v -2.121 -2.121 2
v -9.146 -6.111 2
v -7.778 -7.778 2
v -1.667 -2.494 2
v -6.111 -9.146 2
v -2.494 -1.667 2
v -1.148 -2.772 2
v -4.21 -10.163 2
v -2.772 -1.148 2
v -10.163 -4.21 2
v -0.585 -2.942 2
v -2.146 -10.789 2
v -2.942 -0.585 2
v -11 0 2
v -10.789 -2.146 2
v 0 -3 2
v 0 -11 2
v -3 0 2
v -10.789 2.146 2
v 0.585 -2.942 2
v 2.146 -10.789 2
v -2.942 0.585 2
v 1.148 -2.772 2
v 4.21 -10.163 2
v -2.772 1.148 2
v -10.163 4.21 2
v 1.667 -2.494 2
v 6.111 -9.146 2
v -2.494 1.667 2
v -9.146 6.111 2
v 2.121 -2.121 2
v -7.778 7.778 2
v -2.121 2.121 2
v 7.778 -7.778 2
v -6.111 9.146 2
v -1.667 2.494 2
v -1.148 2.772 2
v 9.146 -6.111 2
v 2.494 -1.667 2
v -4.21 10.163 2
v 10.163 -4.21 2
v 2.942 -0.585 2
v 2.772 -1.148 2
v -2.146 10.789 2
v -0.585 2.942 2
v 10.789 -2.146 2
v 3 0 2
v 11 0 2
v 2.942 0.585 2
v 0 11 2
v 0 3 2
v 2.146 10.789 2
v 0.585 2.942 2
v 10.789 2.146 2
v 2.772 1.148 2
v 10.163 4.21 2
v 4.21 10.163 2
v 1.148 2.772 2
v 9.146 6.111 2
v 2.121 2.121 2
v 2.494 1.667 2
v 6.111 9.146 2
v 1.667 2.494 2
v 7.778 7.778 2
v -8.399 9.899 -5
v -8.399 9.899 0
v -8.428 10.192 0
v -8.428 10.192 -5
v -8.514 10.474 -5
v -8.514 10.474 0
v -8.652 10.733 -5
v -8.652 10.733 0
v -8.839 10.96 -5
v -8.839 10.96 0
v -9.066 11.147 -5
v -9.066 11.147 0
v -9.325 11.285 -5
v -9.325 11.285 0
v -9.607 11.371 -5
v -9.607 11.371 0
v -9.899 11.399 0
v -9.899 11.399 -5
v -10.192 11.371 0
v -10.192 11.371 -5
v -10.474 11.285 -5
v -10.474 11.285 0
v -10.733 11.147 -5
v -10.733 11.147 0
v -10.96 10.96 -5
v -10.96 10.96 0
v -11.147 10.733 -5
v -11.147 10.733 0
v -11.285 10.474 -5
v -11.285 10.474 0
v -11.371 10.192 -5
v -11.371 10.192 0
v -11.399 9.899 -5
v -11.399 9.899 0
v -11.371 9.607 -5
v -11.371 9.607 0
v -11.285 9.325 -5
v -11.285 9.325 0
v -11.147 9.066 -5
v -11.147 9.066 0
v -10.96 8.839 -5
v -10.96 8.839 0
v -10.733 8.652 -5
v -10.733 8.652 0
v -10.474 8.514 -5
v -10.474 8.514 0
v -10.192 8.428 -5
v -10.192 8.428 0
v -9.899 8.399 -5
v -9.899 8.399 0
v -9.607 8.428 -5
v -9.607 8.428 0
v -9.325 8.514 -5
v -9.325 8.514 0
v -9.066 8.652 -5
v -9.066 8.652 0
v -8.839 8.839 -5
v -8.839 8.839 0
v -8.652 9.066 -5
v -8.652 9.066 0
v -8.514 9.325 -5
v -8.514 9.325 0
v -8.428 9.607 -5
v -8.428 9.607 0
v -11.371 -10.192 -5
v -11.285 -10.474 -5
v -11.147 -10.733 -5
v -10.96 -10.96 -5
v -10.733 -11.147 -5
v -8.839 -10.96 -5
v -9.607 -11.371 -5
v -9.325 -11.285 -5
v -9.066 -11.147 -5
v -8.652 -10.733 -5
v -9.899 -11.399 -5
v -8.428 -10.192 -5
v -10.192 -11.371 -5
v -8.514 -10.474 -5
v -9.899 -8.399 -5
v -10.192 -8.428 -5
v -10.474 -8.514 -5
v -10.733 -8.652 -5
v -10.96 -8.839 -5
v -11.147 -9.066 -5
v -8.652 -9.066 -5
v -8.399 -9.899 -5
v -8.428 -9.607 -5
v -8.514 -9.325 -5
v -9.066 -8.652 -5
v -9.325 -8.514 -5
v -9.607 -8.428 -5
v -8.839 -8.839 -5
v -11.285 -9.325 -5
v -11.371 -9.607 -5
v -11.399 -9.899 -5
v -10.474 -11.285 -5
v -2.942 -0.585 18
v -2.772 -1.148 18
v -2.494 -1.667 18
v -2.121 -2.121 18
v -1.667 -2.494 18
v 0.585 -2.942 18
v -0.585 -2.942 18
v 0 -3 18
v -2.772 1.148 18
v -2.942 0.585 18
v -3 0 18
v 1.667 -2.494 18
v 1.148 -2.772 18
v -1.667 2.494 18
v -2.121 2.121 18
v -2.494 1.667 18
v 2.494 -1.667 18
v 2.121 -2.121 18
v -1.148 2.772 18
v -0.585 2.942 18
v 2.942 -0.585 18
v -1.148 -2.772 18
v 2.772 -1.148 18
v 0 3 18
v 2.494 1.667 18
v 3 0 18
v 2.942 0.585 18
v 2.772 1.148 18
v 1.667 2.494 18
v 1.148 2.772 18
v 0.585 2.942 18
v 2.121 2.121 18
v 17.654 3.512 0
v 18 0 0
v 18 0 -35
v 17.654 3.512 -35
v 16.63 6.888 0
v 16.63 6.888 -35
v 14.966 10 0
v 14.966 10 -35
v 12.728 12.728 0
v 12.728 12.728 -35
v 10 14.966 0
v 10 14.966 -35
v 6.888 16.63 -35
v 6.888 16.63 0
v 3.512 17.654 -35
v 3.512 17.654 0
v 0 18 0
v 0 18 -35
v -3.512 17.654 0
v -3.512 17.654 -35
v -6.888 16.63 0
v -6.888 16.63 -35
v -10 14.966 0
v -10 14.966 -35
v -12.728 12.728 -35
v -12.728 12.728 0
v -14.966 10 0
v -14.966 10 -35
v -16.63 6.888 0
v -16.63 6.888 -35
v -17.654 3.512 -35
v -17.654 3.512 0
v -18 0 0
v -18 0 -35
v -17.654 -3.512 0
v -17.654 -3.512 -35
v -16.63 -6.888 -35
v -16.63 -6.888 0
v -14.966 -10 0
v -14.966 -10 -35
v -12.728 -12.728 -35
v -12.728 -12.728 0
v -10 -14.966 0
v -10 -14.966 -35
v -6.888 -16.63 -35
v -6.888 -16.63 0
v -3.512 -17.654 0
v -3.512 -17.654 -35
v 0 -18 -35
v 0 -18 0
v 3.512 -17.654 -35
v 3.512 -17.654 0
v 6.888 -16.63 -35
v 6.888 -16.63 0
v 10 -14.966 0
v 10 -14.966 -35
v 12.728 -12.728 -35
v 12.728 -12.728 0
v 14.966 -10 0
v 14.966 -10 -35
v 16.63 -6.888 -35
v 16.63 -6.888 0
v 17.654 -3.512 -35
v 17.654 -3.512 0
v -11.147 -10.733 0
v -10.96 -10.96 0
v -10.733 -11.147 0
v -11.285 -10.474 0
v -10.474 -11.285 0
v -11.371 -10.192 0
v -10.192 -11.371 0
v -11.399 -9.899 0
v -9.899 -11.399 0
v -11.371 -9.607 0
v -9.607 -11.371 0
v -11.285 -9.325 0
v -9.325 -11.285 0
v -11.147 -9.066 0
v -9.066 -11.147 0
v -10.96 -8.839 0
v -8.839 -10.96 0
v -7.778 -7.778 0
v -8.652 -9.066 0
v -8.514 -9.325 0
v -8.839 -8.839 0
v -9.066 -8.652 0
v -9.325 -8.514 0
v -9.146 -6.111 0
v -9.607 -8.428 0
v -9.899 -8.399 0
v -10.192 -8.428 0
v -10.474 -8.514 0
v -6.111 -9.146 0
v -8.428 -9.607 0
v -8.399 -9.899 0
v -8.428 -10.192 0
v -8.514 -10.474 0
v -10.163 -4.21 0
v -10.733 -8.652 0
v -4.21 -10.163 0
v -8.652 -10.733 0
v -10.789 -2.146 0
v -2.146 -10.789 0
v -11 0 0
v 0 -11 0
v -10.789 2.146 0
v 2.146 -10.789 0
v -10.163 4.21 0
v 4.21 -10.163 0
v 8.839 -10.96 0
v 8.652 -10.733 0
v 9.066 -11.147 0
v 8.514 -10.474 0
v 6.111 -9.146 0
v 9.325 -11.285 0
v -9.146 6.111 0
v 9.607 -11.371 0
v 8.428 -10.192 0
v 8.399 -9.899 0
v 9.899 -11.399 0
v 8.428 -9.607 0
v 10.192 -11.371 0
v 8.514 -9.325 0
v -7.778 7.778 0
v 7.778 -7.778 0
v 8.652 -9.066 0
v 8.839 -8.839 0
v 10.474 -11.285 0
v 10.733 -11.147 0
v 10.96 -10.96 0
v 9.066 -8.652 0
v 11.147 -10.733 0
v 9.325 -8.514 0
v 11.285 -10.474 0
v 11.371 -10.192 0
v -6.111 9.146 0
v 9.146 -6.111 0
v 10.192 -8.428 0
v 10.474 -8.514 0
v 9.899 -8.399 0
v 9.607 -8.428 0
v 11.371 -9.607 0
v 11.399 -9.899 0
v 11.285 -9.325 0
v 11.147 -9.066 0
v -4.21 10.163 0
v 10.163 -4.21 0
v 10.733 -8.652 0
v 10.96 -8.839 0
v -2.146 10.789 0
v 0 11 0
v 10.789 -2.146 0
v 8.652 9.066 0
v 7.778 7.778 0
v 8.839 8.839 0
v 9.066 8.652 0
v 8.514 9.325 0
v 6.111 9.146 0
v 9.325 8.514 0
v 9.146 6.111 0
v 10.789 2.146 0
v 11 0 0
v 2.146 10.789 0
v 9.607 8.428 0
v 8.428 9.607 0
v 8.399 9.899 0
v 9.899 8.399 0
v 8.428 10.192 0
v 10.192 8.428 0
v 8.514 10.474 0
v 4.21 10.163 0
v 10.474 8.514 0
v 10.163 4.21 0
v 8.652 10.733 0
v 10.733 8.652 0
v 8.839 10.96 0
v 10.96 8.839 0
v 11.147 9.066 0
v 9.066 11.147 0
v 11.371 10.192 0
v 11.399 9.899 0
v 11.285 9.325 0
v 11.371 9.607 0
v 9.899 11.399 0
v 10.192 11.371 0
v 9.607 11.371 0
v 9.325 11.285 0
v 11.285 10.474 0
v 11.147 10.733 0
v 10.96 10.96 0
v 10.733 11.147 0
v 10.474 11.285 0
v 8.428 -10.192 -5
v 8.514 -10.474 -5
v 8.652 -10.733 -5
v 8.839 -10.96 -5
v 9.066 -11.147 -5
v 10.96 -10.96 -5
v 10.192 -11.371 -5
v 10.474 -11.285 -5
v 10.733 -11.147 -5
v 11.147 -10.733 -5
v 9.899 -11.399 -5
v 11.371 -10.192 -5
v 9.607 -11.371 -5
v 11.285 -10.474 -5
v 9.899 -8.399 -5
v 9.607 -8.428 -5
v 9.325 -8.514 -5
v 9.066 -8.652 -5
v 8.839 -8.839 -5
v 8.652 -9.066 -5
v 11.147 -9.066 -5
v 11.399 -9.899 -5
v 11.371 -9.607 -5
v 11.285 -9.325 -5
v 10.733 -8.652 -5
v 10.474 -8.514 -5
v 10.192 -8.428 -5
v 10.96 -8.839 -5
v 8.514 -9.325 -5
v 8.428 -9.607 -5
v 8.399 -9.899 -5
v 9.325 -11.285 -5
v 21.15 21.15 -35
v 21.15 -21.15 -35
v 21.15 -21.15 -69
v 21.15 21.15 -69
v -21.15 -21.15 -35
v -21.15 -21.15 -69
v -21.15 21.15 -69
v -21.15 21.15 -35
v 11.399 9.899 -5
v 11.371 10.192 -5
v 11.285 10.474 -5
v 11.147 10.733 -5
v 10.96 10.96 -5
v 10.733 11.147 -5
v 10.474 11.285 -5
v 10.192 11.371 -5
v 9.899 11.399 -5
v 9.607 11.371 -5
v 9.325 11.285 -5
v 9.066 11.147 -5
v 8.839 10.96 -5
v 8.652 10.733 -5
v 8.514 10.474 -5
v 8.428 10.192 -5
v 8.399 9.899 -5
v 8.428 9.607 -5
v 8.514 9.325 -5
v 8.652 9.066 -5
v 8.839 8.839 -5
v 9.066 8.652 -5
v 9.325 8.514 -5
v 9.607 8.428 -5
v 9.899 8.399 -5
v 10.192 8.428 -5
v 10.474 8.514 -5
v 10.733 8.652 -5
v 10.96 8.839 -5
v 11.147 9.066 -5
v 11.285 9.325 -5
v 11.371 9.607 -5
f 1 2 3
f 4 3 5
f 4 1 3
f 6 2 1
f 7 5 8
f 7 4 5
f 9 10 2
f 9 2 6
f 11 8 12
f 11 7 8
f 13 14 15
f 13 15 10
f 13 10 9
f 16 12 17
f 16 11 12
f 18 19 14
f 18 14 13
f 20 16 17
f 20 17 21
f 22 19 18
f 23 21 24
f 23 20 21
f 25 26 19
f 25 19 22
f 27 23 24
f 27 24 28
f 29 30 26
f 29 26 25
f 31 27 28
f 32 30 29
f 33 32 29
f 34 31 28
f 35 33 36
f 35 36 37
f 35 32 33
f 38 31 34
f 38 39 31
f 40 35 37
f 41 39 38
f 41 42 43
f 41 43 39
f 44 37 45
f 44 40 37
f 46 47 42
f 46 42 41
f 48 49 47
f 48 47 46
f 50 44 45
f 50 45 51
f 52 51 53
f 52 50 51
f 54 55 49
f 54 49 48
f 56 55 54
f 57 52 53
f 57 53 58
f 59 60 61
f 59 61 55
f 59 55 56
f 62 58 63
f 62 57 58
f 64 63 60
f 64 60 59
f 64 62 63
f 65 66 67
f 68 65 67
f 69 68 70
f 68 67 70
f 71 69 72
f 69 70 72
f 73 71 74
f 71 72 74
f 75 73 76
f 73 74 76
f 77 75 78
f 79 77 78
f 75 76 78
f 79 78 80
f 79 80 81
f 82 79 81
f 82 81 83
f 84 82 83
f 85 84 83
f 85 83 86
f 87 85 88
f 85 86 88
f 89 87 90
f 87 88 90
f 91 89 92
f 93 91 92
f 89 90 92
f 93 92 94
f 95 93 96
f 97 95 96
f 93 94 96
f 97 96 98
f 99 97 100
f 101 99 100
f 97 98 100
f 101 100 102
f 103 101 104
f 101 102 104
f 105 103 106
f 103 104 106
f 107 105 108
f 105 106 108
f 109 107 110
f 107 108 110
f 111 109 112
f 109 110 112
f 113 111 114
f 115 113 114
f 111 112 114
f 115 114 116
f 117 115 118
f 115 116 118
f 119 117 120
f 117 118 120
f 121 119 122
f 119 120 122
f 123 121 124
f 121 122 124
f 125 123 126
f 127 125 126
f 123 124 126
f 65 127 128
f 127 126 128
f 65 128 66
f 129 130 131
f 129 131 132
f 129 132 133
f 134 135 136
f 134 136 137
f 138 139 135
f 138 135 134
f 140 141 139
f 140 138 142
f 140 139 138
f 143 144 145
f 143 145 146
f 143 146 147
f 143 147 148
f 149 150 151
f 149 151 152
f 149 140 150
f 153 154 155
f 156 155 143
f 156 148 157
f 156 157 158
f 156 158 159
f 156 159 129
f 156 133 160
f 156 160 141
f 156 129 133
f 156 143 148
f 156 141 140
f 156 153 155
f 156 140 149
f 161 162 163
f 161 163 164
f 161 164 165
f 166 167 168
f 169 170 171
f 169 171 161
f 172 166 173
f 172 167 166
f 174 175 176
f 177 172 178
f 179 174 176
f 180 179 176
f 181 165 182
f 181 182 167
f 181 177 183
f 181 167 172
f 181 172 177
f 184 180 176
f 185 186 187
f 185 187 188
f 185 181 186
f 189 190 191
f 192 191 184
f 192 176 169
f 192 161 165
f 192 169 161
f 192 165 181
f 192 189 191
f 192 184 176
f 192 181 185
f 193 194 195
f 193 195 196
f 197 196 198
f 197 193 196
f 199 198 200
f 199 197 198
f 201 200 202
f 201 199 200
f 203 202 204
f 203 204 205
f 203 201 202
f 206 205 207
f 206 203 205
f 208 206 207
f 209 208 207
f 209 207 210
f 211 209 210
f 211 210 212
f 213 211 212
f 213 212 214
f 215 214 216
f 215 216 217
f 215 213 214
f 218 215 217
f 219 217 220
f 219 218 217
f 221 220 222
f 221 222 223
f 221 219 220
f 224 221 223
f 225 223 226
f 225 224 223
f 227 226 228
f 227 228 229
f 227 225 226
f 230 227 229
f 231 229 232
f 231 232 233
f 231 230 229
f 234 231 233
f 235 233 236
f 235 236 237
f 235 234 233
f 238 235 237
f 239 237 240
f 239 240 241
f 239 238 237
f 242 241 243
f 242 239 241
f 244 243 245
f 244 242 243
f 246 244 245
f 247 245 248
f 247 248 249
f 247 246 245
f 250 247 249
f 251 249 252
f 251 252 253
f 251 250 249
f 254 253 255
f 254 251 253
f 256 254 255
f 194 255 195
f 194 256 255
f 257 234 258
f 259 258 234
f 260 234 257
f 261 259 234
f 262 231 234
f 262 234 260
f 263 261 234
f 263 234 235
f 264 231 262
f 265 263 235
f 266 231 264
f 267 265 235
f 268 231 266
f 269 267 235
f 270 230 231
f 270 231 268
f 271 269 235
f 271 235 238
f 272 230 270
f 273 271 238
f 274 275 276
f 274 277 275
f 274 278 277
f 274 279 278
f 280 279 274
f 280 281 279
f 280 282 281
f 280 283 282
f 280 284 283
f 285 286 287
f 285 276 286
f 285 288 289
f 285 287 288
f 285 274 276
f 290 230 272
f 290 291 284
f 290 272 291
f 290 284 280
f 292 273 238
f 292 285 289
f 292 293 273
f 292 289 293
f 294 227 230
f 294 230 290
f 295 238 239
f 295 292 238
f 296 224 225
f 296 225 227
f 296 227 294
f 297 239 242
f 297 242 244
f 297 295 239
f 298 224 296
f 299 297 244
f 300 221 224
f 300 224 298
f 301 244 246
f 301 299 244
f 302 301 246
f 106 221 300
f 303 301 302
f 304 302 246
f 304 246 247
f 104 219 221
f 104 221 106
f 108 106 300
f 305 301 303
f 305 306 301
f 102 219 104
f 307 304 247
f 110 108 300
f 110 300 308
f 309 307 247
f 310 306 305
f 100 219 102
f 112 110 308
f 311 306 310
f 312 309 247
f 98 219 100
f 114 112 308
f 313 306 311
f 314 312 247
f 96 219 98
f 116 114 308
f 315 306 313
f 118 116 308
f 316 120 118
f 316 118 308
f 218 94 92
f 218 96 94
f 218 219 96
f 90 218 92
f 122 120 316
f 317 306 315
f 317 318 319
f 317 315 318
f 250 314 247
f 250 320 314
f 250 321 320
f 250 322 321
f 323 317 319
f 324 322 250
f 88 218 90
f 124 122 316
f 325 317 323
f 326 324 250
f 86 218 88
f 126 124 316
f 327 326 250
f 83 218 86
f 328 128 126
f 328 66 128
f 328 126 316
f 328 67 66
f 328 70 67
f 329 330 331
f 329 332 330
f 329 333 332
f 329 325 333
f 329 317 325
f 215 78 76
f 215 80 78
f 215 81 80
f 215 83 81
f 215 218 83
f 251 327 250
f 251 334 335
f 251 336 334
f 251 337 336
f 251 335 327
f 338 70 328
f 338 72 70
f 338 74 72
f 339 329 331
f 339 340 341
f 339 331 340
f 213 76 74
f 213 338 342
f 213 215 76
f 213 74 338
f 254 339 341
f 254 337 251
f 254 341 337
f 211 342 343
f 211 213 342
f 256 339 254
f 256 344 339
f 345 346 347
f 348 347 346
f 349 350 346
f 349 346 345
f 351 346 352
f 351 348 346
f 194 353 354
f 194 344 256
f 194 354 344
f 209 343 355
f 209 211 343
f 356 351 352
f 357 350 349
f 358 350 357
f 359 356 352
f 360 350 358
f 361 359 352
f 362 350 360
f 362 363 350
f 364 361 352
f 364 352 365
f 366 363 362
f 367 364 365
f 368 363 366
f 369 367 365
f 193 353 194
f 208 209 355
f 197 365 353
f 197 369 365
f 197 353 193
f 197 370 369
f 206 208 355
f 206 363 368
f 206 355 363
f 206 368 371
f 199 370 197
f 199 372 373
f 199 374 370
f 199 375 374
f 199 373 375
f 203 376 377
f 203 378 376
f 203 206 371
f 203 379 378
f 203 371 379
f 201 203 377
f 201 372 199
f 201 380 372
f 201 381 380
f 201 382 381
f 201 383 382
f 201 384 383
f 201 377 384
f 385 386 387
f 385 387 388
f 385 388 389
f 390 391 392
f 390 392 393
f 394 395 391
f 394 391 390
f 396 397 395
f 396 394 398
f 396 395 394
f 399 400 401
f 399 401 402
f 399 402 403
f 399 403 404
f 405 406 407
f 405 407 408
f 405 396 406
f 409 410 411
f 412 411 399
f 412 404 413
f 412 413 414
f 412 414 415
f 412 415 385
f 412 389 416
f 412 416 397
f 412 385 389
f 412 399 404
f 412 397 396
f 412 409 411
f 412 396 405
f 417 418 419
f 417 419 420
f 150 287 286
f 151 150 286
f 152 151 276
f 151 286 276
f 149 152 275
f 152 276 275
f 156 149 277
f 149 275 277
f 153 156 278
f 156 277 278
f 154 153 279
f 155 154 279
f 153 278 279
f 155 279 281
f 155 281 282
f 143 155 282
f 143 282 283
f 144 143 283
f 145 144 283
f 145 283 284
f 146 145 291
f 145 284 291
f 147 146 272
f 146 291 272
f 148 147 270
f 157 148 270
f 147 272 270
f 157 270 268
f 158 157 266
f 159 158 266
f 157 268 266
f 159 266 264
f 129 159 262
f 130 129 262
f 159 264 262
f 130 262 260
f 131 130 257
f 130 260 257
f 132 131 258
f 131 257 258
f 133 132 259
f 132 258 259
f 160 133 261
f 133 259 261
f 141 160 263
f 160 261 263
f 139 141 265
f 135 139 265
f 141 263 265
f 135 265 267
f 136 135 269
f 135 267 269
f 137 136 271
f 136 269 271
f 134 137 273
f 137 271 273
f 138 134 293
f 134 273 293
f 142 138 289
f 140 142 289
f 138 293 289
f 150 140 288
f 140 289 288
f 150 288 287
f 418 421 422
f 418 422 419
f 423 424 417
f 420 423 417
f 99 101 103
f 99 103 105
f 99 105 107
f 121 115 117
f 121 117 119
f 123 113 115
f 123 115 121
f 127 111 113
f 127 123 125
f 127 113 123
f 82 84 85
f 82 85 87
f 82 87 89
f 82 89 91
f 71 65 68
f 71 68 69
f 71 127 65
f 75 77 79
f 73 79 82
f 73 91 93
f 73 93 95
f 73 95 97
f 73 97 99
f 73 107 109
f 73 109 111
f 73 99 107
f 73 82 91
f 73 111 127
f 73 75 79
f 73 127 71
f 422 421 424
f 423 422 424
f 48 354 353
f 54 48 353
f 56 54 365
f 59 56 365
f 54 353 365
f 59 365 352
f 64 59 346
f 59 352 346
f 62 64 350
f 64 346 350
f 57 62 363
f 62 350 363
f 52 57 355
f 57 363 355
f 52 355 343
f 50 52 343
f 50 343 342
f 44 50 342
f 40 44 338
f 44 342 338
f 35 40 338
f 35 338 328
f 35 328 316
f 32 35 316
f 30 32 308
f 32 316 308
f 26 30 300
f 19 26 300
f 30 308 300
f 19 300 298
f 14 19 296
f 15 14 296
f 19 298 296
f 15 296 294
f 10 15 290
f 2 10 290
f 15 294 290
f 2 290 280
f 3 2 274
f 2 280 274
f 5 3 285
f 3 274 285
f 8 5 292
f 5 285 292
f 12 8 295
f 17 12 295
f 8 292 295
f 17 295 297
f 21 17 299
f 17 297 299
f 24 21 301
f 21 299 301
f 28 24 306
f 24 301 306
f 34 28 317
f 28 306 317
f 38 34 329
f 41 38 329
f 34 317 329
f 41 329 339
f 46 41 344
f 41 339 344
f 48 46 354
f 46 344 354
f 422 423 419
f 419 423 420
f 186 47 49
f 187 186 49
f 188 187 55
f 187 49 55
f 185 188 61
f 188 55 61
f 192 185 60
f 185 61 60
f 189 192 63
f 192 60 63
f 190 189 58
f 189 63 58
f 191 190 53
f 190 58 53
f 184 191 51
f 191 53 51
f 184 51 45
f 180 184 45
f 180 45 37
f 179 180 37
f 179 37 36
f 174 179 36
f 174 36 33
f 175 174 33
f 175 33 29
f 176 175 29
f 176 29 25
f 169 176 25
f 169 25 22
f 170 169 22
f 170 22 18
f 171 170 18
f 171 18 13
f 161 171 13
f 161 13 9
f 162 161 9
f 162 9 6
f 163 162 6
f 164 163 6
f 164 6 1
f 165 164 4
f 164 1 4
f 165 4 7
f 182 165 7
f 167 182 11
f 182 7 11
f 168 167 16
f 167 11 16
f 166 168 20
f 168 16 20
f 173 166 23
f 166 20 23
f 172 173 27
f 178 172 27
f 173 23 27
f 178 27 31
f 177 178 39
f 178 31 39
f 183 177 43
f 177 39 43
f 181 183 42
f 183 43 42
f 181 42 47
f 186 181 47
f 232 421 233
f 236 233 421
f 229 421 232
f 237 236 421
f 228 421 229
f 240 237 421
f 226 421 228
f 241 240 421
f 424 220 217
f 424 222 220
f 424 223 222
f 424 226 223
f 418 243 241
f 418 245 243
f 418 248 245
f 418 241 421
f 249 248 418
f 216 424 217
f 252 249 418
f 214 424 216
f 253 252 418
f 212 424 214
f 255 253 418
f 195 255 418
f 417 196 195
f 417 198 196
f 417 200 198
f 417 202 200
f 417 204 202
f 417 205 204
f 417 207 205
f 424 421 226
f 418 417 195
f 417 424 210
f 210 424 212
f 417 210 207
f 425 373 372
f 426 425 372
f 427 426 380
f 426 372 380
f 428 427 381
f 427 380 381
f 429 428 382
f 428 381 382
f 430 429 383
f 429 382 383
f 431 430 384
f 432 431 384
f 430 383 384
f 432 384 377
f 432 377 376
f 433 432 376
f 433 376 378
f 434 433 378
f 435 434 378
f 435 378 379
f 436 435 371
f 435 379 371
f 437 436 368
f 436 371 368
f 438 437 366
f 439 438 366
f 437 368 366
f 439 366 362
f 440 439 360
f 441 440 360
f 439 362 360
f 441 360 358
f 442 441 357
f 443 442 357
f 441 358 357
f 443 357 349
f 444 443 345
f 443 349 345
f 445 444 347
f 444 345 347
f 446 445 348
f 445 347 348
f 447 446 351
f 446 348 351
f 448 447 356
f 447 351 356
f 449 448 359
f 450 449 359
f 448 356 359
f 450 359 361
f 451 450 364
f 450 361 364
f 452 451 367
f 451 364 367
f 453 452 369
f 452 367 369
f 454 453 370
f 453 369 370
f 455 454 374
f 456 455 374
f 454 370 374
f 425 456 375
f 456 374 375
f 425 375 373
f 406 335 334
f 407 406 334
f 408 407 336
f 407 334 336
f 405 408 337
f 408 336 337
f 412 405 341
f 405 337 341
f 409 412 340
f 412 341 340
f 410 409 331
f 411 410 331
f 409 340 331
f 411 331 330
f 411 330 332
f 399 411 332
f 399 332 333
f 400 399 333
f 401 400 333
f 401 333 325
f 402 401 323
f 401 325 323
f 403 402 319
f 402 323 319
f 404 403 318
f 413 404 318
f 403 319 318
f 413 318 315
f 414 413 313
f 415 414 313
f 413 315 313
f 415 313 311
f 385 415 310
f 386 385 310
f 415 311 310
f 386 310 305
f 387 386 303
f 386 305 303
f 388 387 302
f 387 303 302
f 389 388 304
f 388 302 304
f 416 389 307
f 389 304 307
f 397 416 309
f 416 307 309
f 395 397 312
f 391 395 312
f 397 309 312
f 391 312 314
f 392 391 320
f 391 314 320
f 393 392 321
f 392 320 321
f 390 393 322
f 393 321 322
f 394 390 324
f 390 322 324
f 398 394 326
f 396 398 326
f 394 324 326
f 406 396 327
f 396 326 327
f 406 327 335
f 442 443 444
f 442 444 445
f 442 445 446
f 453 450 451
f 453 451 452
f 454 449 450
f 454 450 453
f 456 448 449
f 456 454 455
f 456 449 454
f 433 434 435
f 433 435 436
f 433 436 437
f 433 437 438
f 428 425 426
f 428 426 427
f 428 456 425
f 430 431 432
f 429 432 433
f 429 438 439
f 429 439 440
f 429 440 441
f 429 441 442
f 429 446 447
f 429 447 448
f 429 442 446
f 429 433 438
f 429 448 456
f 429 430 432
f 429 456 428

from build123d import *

# Parameters (mm, degrees)
SKETCH_R     = 18
PAD_DEPTH    = 35
SKETCH001_W  = 42.3
SKETCH001_H  = 42.3
PAD001_DEPTH = 34
SKETCH002_R  = 11
PAD002_DEPTH = 2
SKETCH003_R  = 3
PAD003_DEPTH = 18
SKETCH004_R  = 1.5
POCKET_DEPTH = 5


with BuildPart() as part:
    # Sketch → Pad (new body)
    with BuildSketch(Plane.XY):
        Circle(SKETCH_R)
    extrude(amount=-PAD_DEPTH)

    # Sketch001 → Pad001 (join)
    with BuildSketch(Plane.XY.offset(-35)):
        Rectangle(SKETCH001_W, SKETCH001_H)
    extrude(amount=-PAD001_DEPTH)

    # Sketch002 → Pad002 (join)
    with BuildSketch(Plane.XY):
        Circle(SKETCH002_R)
    extrude(amount=PAD002_DEPTH)

    # Sketch003 → Pad003 (join)
    with BuildSketch(Plane.XY):
        Circle(SKETCH003_R)
    extrude(amount=PAD003_DEPTH)

    # Sketch004 → Pocket (cut)
    with BuildSketch(Plane.XY):
        with Locations((-9.899495, 9.899495)):
            Circle(SKETCH004_R)
        with Locations((9.899495, 9.899495)):
            Circle(SKETCH004_R)
        with Locations((9.899495, -9.899495)):
            Circle(SKETCH004_R)
        with Locations((-9.899495, -9.899495)):
            Circle(SKETCH004_R)
    extrude(amount=-POCKET_DEPTH, mode=Mode.SUBTRACT)


solid = part.part
